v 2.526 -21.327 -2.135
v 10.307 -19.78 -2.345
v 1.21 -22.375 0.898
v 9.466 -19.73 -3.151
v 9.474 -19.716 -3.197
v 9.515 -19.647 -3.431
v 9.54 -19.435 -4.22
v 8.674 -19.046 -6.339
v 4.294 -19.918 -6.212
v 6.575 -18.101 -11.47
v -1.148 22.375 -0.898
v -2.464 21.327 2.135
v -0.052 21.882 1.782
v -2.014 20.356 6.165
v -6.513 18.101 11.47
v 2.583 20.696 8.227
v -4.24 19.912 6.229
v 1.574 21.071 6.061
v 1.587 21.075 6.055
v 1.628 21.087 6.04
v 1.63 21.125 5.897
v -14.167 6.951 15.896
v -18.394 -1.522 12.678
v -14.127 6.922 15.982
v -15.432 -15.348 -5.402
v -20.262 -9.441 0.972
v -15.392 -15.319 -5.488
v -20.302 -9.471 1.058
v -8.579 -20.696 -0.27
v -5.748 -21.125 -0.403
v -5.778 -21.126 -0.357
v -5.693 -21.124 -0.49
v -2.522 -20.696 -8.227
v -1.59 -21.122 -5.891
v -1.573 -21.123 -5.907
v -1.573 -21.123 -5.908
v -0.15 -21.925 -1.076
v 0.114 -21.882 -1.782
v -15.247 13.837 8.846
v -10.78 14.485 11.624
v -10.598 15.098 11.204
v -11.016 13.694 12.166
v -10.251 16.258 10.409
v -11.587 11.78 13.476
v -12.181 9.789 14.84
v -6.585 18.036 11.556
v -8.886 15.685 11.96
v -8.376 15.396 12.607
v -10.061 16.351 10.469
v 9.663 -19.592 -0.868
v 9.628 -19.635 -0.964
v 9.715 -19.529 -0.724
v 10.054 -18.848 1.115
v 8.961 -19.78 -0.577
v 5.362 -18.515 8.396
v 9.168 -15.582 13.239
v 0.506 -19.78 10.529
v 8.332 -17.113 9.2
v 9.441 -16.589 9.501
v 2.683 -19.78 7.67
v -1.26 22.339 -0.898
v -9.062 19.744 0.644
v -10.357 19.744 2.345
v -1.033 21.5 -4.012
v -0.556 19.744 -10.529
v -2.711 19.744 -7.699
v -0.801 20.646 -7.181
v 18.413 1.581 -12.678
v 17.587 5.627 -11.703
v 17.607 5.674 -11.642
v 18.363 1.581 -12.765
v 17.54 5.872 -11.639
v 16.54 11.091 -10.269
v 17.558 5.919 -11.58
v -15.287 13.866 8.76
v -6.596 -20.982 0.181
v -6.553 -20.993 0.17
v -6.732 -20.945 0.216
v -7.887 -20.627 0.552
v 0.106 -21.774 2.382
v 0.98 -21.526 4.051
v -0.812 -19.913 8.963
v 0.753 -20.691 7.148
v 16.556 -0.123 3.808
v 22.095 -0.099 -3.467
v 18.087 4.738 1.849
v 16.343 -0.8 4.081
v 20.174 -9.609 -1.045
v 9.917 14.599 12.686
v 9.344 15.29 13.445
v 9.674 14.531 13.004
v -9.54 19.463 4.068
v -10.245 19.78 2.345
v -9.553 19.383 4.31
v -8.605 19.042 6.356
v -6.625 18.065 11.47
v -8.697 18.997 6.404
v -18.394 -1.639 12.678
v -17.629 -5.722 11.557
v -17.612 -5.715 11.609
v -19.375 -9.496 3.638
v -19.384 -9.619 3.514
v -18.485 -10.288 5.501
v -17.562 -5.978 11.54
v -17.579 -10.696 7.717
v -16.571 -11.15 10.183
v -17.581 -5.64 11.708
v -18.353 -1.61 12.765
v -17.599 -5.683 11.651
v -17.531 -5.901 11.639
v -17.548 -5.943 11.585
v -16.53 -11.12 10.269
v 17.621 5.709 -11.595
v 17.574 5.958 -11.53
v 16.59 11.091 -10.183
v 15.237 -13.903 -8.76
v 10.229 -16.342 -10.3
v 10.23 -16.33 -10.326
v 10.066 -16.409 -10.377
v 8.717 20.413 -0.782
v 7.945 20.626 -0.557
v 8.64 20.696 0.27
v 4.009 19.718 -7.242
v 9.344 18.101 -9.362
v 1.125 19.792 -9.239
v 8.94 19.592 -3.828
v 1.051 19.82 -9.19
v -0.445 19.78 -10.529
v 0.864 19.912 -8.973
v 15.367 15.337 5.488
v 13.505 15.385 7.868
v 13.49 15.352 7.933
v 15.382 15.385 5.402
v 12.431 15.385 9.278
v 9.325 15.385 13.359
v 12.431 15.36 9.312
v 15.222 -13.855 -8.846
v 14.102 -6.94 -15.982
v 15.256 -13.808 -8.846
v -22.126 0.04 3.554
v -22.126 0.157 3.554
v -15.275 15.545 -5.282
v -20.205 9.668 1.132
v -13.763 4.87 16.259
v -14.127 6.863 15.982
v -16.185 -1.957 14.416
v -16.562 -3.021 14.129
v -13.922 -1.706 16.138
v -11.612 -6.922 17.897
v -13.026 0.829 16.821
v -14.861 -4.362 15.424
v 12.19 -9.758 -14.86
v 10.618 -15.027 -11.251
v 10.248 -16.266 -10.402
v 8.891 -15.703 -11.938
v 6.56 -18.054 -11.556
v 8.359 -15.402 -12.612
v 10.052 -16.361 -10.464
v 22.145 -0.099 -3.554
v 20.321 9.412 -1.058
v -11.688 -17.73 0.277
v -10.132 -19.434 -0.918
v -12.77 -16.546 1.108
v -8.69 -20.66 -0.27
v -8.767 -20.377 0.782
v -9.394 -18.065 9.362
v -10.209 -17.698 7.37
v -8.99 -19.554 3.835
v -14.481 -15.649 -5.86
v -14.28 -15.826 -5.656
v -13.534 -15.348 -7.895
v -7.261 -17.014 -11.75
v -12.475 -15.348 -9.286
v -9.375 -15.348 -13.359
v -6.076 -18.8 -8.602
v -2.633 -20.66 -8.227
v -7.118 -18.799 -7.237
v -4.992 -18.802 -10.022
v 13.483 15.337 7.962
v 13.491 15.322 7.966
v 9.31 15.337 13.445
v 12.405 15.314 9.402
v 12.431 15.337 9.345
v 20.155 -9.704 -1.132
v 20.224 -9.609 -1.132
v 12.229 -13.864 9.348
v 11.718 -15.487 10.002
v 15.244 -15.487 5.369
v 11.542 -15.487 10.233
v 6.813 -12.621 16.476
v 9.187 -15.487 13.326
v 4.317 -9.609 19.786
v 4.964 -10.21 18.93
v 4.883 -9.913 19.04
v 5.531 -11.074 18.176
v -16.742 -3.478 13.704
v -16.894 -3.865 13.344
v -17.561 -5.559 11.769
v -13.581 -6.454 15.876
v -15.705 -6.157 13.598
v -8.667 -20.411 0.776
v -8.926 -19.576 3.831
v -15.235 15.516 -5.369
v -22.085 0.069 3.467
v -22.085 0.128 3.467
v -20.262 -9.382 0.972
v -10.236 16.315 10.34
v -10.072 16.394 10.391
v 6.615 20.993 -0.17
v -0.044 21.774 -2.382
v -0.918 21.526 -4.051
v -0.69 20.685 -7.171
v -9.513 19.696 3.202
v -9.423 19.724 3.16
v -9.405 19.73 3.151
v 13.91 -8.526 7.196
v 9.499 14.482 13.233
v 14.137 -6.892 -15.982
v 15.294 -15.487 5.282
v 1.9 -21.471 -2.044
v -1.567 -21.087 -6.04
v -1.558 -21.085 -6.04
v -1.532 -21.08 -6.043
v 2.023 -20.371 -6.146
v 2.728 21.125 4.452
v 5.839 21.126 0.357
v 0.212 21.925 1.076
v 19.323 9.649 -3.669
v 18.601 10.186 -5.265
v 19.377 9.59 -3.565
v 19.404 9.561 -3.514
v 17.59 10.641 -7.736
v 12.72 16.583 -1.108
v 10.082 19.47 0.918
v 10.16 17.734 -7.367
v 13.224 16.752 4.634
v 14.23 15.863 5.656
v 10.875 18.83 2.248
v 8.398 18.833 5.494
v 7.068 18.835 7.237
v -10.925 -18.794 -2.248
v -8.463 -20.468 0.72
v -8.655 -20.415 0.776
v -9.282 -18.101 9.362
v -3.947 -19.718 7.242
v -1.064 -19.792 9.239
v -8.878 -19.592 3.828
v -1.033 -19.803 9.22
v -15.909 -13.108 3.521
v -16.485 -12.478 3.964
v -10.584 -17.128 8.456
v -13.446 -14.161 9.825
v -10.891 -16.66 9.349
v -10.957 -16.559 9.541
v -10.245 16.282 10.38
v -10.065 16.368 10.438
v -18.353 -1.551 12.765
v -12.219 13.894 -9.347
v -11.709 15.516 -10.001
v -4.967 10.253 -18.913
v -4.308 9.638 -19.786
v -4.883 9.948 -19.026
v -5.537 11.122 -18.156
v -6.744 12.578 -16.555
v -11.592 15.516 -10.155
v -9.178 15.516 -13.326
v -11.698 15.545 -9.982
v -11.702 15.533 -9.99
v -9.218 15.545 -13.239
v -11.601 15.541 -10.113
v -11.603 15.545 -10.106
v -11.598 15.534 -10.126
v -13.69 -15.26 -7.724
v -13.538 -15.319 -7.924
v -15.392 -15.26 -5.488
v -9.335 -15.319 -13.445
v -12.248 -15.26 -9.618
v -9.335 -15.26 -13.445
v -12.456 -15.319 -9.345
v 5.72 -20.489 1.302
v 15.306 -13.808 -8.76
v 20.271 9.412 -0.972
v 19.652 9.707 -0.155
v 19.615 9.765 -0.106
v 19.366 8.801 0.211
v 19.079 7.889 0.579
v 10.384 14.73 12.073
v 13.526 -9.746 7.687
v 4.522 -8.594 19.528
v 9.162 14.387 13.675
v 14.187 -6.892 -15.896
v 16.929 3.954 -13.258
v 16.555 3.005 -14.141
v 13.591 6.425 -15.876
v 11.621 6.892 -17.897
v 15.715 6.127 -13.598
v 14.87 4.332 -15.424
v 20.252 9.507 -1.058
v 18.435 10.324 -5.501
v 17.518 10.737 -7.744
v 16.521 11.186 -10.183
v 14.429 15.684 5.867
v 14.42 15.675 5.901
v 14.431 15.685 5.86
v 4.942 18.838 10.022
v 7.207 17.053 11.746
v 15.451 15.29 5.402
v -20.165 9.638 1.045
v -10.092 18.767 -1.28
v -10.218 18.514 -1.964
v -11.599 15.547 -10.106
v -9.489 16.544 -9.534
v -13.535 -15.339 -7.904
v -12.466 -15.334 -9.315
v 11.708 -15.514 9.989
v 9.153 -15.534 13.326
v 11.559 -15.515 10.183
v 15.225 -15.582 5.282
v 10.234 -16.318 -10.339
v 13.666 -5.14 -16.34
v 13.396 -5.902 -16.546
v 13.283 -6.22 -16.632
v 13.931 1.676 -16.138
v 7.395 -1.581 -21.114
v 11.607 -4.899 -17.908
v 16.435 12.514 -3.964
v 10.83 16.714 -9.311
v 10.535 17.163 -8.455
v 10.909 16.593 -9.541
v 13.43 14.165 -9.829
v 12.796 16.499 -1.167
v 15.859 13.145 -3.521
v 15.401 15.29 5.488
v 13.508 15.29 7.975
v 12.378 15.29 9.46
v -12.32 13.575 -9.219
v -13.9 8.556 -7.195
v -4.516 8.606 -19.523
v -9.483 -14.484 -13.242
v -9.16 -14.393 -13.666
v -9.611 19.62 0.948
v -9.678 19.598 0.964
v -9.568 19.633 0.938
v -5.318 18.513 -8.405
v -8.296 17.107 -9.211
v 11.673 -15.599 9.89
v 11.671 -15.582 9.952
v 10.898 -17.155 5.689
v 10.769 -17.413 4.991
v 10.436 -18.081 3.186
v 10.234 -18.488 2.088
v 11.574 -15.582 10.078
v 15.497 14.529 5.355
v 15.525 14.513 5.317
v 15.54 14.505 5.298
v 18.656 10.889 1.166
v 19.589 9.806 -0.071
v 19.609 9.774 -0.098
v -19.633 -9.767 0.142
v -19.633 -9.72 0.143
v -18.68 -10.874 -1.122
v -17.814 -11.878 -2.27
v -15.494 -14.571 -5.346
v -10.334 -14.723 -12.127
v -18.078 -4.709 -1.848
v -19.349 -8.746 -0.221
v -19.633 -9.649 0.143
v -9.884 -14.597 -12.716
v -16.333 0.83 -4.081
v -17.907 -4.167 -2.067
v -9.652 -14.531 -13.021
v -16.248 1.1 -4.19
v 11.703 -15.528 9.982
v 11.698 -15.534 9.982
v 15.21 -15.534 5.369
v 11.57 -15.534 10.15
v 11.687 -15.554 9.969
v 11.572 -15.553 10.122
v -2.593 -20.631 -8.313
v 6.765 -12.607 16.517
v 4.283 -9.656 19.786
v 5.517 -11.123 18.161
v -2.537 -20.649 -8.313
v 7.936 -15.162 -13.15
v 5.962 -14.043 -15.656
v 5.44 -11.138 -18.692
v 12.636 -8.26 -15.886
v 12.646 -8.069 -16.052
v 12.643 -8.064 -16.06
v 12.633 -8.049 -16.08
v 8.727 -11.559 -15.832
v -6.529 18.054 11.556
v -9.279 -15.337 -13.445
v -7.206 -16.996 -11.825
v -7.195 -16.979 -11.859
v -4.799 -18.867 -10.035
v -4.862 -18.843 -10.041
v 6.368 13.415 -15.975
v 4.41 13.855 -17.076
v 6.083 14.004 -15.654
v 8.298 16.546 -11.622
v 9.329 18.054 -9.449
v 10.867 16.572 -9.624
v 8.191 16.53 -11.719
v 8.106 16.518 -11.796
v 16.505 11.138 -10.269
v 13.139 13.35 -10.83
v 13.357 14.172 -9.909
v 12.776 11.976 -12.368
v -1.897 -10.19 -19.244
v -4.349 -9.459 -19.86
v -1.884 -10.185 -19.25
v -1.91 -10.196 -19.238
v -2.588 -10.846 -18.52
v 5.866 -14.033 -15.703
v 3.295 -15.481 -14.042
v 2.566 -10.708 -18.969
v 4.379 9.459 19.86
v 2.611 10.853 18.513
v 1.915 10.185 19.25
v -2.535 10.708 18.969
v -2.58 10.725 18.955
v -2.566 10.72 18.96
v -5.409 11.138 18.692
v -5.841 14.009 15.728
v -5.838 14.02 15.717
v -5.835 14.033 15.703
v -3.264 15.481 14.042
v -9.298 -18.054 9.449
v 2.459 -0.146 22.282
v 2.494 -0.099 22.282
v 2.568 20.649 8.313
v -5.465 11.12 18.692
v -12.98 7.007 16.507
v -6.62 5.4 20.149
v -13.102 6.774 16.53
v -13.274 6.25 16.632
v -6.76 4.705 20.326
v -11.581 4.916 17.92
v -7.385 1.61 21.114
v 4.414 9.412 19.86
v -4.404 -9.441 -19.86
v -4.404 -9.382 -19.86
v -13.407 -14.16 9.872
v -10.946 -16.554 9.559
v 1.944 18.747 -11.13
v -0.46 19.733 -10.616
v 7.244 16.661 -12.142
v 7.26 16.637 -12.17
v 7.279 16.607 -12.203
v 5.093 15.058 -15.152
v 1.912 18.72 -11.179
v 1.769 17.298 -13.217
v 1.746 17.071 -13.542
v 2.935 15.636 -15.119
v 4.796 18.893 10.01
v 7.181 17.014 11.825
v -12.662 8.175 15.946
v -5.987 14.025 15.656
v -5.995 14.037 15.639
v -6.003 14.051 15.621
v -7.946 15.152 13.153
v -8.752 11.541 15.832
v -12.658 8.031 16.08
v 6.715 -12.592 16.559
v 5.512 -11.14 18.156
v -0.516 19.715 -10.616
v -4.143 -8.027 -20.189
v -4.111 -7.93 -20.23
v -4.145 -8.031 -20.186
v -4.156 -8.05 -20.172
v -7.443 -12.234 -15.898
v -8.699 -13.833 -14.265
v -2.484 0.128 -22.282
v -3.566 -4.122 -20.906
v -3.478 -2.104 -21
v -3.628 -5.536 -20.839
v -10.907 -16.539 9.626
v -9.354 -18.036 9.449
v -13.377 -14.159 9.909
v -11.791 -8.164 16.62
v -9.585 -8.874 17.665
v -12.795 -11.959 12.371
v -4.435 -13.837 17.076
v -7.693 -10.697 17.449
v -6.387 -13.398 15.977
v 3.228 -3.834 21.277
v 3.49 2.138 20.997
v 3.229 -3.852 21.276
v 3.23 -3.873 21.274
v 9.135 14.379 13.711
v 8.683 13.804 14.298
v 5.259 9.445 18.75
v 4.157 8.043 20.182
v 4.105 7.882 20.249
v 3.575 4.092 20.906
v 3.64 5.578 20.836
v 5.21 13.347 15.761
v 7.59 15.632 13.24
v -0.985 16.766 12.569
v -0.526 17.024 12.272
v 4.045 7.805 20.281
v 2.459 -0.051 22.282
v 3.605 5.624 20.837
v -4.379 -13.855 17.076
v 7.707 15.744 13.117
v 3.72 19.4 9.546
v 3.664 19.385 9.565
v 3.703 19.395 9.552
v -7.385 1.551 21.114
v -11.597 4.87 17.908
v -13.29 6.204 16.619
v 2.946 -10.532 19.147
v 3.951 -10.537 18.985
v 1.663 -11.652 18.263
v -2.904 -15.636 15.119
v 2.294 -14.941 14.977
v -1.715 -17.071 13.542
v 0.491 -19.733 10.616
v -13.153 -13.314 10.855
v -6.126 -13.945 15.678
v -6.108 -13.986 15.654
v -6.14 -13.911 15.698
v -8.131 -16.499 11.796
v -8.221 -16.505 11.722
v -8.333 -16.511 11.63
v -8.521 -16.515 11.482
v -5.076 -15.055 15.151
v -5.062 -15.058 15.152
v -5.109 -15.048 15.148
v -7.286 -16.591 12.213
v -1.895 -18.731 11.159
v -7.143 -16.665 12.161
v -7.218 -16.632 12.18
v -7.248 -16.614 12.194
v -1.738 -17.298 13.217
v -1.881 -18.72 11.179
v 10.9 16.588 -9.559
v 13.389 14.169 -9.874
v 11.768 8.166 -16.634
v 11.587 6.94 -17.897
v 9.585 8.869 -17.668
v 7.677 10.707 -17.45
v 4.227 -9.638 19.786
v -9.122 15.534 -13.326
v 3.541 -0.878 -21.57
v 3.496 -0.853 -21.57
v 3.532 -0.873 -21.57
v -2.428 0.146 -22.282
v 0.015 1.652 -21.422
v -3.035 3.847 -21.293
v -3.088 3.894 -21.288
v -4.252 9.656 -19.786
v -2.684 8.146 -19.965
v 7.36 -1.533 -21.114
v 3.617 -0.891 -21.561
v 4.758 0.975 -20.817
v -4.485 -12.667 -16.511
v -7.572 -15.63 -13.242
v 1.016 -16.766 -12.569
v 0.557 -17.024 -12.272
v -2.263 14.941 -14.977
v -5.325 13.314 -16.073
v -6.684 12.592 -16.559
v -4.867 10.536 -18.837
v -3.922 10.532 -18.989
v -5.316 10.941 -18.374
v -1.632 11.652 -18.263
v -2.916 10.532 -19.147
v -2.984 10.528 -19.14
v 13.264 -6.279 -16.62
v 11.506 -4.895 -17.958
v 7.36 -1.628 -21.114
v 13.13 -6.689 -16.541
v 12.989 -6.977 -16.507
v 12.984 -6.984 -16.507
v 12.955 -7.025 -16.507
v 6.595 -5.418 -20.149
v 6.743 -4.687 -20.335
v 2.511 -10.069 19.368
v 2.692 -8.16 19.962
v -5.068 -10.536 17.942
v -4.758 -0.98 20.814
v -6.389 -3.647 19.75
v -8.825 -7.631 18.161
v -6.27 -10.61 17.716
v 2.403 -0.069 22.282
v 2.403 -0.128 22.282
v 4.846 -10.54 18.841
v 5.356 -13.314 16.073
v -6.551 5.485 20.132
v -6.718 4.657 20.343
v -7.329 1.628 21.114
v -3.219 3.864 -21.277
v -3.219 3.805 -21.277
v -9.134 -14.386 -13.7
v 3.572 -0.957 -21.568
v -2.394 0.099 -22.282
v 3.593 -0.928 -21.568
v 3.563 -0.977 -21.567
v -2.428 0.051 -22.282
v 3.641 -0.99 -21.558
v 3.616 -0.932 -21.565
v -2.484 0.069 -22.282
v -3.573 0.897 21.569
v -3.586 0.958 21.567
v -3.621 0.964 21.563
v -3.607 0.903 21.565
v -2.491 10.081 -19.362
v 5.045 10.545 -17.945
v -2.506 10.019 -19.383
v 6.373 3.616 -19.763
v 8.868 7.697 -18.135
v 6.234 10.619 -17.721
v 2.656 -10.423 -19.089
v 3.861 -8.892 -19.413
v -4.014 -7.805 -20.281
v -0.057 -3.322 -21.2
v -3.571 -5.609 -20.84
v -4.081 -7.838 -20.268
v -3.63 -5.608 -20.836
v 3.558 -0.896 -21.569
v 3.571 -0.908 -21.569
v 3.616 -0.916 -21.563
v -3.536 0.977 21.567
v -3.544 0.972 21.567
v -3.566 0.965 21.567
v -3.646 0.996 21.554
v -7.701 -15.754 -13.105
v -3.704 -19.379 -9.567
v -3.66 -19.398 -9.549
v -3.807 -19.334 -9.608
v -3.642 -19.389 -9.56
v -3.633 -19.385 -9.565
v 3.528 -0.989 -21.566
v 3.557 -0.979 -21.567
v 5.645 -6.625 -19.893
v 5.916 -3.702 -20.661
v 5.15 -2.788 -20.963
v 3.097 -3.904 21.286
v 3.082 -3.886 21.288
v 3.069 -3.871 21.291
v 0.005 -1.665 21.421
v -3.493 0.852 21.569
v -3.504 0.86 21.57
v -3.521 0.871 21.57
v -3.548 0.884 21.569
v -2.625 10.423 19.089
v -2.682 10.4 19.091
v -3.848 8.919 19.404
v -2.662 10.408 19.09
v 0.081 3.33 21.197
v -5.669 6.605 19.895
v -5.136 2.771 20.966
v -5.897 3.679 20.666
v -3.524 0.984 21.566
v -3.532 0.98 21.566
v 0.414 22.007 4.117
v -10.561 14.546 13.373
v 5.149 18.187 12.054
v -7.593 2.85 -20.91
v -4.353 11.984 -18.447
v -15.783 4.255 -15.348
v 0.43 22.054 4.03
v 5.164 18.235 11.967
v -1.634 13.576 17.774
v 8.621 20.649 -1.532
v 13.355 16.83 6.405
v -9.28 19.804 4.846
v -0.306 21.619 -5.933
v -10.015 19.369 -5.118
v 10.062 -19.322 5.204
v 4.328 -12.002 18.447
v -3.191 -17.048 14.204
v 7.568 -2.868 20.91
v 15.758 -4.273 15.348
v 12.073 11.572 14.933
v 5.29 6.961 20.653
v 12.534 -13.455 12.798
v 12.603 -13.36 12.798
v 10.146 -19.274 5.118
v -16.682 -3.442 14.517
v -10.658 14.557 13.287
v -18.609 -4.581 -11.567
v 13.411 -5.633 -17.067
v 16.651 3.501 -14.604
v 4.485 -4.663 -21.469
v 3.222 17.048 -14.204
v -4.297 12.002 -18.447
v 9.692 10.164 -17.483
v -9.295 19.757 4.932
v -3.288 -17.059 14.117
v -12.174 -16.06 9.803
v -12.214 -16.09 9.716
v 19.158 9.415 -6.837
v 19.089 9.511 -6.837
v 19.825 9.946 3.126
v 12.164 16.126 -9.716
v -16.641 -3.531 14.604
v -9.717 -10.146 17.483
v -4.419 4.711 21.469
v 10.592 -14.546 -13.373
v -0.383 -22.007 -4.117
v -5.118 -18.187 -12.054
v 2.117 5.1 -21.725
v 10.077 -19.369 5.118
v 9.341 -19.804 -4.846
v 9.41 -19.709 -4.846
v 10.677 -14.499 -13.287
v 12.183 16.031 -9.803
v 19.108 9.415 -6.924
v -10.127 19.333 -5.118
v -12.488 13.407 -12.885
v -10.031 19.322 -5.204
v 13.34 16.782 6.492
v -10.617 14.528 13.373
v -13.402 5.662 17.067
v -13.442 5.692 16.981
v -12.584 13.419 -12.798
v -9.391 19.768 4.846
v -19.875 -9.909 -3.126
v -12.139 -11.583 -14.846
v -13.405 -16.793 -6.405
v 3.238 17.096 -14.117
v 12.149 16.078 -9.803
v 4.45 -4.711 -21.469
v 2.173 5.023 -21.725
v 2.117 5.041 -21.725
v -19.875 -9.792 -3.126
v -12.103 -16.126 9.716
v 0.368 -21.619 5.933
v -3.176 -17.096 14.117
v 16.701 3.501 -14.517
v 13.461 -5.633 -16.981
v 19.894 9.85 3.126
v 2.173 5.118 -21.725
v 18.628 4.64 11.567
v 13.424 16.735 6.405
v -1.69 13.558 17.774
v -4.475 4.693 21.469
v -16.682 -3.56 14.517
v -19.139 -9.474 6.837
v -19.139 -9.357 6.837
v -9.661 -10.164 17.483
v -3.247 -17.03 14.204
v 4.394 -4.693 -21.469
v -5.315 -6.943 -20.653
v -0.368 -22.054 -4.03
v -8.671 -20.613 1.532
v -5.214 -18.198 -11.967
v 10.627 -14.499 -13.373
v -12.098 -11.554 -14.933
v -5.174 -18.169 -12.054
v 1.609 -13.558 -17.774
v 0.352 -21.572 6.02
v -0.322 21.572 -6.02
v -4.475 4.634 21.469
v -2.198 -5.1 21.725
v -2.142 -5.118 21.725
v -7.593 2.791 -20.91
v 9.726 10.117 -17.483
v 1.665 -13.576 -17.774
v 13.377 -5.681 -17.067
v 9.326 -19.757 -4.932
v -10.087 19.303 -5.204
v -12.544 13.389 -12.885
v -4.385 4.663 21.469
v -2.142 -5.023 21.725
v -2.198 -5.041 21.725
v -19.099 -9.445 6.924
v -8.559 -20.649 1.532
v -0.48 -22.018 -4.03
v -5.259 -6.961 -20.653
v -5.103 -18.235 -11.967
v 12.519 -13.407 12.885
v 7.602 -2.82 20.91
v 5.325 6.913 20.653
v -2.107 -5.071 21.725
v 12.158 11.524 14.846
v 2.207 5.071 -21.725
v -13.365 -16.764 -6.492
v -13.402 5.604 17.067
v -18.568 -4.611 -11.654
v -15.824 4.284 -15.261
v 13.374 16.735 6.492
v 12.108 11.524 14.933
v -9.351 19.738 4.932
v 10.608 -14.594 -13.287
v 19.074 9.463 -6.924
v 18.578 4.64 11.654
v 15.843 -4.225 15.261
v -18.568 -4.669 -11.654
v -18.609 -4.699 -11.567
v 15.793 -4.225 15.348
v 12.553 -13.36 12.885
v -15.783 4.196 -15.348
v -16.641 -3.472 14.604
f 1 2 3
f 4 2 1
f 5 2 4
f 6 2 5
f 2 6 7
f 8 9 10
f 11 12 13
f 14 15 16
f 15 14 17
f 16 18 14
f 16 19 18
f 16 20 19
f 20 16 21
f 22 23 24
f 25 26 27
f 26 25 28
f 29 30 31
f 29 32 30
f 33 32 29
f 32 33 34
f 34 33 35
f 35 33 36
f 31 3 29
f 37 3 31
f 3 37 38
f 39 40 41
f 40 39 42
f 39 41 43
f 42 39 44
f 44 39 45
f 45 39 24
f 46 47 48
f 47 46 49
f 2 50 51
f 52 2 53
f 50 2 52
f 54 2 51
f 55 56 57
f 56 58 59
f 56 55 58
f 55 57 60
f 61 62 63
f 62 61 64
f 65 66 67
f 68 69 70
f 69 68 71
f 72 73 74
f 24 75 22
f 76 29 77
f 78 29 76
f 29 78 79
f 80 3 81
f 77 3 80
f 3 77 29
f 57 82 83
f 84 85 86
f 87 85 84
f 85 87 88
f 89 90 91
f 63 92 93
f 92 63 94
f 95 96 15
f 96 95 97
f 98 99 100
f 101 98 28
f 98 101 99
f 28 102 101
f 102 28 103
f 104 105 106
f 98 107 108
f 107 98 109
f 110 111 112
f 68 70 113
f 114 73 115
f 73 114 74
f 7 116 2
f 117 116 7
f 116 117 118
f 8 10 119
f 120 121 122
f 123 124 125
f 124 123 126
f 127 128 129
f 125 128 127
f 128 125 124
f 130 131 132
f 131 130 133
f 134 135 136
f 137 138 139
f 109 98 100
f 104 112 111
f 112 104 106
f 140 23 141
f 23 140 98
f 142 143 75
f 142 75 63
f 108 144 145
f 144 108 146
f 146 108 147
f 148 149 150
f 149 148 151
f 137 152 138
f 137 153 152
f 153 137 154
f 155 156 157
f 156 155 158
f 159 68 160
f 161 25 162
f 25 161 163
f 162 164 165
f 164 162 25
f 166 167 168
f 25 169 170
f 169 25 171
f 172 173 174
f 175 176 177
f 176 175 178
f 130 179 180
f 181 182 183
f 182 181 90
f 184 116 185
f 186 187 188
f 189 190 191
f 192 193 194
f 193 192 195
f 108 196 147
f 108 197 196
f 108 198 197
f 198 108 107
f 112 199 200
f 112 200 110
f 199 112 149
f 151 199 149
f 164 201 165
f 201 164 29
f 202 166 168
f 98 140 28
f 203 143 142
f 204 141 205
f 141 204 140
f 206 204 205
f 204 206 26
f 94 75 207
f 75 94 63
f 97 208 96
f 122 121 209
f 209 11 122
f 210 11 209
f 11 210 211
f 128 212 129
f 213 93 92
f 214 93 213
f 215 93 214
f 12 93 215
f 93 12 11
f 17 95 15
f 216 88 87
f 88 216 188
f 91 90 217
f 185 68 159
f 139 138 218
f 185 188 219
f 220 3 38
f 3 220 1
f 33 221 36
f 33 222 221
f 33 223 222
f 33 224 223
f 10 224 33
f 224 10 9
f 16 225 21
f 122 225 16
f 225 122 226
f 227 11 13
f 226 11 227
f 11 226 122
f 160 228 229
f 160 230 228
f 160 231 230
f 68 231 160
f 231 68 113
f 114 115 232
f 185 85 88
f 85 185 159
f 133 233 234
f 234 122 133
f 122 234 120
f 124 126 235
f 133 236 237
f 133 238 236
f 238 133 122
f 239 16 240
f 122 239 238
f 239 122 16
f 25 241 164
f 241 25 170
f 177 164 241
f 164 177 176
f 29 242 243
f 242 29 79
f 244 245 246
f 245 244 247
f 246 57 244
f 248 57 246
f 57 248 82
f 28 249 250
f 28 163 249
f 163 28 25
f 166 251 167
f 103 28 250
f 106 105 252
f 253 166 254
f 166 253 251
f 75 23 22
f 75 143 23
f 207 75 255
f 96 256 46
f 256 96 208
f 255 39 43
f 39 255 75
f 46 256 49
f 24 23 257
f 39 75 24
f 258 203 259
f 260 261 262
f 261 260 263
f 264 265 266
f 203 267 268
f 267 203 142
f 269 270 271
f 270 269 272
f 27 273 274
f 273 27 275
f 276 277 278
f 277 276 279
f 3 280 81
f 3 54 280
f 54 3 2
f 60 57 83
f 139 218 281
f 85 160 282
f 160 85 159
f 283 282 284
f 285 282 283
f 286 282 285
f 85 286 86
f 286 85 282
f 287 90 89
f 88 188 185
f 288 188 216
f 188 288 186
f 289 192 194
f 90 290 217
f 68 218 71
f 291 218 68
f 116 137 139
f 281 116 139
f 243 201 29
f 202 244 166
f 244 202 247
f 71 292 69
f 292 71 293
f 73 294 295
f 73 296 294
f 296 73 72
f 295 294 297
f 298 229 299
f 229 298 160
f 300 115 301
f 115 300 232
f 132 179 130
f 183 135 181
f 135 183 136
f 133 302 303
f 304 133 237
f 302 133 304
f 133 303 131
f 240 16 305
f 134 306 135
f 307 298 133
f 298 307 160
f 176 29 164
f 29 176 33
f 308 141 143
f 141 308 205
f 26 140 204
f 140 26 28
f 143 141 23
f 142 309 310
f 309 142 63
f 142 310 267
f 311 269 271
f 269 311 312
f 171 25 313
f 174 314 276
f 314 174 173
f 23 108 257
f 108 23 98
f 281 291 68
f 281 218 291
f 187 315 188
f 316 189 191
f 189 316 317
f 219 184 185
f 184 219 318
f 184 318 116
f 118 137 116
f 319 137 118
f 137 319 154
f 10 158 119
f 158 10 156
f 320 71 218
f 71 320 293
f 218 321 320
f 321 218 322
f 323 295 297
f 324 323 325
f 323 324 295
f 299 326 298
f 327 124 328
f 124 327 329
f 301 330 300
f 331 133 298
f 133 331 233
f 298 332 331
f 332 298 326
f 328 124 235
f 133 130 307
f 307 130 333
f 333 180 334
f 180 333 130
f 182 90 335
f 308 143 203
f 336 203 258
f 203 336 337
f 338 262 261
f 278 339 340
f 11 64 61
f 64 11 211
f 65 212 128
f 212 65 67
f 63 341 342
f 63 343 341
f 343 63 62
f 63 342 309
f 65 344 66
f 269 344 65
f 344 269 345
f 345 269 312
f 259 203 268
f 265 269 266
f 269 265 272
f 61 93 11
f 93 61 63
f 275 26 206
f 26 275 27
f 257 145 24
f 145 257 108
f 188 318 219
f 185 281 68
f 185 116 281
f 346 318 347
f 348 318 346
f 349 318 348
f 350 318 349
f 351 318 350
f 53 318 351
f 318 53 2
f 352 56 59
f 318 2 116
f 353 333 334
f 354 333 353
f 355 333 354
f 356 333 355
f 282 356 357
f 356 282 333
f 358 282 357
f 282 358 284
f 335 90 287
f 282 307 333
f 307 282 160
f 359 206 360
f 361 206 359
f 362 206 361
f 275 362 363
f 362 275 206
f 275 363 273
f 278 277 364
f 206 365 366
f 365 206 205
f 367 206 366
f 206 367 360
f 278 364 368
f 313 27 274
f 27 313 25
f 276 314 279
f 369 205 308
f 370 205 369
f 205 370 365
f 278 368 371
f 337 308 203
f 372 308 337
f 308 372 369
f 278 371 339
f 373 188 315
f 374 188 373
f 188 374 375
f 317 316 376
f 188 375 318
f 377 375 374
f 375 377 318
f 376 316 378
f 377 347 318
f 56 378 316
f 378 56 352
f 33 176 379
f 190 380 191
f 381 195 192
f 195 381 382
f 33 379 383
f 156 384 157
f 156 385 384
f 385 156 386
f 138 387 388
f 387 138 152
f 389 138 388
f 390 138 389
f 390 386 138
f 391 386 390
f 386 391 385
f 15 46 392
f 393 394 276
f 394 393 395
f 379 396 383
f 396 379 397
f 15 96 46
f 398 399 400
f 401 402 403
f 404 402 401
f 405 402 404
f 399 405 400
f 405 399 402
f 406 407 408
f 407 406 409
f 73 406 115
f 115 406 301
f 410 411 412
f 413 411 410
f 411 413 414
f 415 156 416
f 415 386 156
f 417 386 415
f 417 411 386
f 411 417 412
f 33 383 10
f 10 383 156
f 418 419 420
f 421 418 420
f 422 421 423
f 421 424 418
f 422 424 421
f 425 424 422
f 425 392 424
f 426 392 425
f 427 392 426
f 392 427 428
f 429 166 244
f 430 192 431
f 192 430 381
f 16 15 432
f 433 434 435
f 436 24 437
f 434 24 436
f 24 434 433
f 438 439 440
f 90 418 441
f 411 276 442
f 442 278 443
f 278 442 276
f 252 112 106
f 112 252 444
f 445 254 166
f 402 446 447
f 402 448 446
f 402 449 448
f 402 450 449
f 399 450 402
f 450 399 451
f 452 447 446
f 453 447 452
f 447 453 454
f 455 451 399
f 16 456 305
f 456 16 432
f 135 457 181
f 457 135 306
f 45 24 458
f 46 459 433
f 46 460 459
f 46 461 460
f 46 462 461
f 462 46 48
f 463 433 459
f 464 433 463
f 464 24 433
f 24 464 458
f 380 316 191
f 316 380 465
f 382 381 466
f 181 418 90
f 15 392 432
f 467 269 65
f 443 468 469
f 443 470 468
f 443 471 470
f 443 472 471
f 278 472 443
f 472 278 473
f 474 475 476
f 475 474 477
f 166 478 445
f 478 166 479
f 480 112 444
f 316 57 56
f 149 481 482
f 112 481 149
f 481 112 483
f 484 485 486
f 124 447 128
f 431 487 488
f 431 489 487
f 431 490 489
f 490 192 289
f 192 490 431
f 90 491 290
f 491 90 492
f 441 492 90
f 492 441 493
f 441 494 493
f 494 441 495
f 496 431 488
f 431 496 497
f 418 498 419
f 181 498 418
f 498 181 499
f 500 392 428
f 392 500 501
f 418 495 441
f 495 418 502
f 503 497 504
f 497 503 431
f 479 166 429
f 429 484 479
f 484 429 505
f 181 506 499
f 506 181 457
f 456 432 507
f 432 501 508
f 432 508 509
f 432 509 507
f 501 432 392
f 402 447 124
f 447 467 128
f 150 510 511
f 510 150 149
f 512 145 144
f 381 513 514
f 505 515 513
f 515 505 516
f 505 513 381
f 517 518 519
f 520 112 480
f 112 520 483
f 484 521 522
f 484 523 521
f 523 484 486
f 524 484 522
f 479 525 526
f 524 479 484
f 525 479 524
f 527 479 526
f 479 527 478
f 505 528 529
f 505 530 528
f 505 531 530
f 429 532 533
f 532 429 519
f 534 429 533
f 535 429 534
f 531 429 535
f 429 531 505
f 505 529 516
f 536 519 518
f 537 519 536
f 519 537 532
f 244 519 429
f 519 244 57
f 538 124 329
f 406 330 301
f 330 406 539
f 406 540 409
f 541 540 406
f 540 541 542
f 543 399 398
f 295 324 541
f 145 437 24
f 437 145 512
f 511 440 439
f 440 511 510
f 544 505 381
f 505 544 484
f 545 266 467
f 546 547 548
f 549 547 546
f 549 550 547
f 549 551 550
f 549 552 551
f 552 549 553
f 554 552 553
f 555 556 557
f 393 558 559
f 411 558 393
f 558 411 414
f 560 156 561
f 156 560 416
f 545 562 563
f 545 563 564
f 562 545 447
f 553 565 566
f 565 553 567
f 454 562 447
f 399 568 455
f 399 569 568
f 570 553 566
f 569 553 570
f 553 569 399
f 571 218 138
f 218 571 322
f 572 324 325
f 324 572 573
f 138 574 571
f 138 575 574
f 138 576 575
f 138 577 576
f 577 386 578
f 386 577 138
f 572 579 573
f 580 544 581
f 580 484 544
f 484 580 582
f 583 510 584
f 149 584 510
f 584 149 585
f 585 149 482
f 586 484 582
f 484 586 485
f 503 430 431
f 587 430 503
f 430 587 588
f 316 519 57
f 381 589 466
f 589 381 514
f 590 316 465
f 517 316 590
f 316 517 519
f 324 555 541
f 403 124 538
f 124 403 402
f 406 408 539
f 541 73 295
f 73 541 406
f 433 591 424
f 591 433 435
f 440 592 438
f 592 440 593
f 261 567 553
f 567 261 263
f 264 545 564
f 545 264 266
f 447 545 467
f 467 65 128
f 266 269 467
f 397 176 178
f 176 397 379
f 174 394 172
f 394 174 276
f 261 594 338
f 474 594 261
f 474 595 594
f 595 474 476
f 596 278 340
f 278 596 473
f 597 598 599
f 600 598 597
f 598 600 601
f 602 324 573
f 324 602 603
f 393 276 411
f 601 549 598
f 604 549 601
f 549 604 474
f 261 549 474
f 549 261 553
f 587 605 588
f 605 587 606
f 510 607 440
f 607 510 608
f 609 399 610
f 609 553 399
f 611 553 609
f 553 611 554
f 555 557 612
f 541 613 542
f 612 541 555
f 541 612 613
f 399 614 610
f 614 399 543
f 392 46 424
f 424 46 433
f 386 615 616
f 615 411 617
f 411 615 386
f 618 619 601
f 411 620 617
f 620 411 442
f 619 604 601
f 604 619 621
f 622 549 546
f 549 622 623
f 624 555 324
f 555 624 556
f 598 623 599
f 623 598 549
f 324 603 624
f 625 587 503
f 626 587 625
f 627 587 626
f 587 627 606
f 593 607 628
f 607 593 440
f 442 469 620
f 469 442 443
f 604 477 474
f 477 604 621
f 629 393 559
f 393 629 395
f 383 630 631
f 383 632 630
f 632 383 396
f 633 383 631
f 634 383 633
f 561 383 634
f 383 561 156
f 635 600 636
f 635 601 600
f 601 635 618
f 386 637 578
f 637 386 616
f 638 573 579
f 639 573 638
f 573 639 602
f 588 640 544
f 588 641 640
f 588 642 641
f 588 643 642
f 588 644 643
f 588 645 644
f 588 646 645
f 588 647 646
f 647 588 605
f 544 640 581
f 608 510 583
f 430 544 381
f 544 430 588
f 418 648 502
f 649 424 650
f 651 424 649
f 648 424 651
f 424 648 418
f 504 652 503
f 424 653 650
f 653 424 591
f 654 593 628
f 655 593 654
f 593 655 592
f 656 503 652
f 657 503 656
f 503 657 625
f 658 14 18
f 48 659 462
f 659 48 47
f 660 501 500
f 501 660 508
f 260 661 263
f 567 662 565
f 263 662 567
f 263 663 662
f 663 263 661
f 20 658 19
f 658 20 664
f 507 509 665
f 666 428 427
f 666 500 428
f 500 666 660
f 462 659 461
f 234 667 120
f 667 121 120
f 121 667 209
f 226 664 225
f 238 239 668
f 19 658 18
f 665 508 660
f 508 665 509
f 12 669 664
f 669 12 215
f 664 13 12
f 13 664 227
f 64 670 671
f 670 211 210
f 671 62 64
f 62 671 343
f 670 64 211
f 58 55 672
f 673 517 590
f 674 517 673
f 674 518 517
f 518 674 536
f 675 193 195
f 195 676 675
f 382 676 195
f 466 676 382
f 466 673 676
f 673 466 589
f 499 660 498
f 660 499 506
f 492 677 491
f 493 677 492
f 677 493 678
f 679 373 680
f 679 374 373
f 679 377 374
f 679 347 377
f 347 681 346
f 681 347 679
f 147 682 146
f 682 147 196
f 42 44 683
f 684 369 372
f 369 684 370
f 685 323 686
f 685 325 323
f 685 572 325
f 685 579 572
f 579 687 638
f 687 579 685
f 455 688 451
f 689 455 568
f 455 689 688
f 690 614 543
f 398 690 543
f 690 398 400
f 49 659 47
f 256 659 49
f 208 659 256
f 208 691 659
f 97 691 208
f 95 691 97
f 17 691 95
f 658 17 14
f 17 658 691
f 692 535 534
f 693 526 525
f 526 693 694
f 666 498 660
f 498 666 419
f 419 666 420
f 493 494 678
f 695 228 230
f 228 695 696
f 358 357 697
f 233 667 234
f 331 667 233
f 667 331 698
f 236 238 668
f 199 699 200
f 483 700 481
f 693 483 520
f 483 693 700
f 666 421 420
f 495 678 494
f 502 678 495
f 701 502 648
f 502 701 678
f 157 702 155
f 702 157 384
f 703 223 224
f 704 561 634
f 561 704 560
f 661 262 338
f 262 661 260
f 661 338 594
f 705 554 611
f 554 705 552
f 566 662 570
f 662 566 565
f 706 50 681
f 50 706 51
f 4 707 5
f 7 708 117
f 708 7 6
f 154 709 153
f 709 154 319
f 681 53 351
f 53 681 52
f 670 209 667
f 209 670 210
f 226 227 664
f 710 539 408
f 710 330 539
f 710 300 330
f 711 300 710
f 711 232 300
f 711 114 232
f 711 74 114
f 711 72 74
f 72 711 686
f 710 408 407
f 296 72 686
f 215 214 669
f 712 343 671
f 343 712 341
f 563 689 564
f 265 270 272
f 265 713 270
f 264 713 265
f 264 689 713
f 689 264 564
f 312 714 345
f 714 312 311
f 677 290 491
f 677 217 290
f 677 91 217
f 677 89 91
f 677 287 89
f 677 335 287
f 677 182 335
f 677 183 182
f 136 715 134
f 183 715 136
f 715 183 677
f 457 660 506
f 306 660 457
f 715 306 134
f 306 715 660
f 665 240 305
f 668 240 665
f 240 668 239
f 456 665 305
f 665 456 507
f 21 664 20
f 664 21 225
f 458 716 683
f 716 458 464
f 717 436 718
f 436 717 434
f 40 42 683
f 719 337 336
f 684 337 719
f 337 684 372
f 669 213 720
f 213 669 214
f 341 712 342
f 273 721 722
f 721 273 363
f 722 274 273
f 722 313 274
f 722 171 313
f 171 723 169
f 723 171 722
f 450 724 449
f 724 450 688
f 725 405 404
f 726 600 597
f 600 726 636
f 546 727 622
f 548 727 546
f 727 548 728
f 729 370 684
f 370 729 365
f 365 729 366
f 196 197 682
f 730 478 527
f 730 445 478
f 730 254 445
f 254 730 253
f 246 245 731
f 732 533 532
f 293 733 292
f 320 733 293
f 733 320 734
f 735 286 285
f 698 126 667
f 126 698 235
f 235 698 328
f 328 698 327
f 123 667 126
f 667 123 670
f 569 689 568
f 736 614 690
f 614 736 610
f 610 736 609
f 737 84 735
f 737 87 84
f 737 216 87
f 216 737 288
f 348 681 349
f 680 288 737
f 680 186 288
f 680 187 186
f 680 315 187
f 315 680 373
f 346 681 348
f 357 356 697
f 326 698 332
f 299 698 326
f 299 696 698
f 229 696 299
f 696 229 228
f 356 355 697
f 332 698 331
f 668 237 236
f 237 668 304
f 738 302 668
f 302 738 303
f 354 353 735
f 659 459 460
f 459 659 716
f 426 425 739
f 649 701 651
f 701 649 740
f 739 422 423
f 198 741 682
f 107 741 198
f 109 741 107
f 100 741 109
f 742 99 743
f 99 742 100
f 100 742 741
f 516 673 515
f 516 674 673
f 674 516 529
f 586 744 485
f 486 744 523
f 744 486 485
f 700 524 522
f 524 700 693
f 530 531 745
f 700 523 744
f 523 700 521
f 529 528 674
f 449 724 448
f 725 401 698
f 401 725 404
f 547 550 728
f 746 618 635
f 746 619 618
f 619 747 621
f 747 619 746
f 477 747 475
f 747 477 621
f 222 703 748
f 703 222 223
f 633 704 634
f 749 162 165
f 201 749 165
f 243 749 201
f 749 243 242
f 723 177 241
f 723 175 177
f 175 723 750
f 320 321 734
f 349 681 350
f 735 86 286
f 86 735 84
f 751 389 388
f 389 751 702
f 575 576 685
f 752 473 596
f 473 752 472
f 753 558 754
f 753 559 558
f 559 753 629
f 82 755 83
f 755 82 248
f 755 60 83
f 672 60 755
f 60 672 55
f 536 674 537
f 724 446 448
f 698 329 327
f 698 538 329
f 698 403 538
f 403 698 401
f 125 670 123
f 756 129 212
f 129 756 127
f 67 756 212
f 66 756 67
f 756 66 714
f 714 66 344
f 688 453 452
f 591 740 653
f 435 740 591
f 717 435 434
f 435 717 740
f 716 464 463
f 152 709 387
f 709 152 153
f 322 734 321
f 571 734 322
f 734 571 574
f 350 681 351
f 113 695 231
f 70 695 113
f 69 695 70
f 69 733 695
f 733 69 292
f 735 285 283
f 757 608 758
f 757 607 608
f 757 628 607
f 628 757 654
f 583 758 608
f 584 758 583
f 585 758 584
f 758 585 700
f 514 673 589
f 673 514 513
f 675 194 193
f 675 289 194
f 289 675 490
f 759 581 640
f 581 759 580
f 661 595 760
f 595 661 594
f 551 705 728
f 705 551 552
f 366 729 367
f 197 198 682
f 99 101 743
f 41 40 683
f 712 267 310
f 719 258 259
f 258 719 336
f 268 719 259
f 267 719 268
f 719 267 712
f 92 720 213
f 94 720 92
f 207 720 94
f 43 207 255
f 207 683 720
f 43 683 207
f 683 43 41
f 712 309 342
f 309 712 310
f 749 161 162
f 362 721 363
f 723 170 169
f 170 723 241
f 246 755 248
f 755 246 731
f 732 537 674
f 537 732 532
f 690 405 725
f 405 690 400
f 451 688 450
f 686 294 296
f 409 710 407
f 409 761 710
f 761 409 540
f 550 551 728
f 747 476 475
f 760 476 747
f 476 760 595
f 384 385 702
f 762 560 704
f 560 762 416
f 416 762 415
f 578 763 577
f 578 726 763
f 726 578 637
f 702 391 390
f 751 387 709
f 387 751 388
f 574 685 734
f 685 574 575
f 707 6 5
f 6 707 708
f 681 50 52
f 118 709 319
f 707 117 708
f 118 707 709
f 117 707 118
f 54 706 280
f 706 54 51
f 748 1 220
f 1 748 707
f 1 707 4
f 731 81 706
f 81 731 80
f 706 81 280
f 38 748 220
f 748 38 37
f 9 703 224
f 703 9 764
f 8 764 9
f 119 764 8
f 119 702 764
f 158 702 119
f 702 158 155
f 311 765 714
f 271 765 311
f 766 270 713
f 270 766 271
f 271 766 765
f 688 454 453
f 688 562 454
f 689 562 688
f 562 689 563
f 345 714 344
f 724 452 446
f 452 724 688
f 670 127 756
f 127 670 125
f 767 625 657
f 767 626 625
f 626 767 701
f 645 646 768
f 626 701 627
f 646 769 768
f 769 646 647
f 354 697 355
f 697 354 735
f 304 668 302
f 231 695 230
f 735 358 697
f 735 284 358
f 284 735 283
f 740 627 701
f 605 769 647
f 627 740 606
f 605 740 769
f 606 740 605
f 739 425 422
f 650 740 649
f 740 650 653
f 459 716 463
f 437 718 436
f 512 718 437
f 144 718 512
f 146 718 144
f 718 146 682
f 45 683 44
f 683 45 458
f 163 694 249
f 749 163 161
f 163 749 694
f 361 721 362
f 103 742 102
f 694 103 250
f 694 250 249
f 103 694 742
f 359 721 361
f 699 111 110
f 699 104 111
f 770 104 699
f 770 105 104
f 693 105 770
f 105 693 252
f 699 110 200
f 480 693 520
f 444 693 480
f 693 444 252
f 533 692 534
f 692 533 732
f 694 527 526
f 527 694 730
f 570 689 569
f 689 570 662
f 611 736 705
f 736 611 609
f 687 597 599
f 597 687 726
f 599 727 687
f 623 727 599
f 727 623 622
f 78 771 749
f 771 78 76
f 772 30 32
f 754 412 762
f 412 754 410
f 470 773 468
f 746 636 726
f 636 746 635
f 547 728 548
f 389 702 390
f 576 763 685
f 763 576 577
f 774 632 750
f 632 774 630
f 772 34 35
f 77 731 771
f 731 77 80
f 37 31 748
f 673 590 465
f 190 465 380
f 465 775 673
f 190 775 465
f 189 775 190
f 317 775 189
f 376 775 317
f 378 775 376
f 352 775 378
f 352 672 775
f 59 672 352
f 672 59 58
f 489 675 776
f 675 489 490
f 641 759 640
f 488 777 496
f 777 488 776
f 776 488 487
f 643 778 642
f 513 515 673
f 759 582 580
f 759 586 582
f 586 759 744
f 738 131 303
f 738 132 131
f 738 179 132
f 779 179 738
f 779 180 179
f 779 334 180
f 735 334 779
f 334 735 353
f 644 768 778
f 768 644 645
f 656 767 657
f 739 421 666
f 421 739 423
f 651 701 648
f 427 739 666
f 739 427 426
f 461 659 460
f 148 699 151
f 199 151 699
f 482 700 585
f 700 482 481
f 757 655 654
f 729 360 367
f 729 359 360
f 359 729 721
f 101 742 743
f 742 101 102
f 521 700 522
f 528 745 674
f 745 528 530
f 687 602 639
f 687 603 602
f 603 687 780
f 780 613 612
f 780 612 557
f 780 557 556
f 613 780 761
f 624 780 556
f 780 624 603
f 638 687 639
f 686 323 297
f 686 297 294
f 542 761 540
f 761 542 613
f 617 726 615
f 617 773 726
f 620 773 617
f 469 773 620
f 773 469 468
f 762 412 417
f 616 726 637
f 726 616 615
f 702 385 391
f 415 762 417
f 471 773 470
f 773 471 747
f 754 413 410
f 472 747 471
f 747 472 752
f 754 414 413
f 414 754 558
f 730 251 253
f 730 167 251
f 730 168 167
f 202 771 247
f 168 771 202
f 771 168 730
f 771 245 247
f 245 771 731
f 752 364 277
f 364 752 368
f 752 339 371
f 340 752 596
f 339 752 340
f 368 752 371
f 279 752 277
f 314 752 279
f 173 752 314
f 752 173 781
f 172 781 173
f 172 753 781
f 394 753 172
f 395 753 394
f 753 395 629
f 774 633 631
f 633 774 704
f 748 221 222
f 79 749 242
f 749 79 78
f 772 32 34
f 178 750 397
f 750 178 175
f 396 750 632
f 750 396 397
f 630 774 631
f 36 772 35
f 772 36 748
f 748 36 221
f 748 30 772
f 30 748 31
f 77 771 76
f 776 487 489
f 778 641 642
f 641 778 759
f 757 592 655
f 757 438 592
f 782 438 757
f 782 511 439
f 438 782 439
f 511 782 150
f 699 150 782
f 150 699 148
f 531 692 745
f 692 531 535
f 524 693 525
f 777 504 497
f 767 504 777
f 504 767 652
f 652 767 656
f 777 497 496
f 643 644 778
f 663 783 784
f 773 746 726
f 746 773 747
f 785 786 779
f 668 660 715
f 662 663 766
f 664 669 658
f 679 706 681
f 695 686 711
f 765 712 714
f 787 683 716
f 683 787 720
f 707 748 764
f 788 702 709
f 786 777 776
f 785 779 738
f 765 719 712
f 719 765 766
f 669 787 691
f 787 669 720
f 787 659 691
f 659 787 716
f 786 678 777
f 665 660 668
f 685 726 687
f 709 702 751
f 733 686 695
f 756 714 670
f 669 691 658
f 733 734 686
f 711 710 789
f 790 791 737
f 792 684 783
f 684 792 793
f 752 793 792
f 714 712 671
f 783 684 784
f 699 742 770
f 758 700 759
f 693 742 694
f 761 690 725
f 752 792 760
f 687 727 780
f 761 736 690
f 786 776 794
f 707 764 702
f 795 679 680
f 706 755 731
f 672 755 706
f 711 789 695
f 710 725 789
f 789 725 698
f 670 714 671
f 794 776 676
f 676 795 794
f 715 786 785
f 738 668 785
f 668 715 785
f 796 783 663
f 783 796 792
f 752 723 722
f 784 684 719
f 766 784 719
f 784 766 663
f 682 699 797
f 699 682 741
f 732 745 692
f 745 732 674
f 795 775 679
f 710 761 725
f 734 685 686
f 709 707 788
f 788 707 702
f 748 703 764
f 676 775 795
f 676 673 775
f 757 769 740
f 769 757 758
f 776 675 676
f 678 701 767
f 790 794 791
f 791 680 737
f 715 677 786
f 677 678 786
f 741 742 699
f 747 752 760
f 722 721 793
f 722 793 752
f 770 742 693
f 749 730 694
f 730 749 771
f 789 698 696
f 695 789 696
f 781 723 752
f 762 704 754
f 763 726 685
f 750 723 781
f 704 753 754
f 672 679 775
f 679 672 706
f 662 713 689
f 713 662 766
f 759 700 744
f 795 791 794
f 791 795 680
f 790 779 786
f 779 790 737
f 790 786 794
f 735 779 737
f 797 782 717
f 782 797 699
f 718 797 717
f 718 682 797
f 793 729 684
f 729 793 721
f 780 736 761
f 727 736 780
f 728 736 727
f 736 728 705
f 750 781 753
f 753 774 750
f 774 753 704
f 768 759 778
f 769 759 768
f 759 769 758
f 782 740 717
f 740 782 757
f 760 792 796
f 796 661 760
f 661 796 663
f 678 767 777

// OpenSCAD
// Auto-generated OpenSCAD file

    inner_points = 10*[[0.9310411281195976, -1.9708956644454598, -0.48456235421219784], [-0.033699334115551816, 2.1524185182257494, -0.5933185103962525], [-0.03989472684997508, -2.195916826294735, -0.40302069458653744], [-1.0046351890851246, 1.9273973563764744, -0.5117768507705921], [1.0046351890851246, -1.9273973563764744, 0.5117768507705921], [0.03989472684997508, 2.195916826294735, 0.40302069458653744], [0.033699334115551816, -2.1524185182257494, 0.5933185103962525], [-0.9310411281195976, 1.9708956644454598, 0.48456235421219784], [0.4434653698557001, -0.46631153386828283, -2.1382142073749177], [0.21572104012363613, 0.5070709058311078, -2.1638880532059384], [-0.5274704851138725, -0.6913326957175581, -2.0566725477492573], [-0.7552148148459366, 0.2820497439818326, -2.082346393580278], [0.7552148148459366, -0.2820497439818326, 2.082346393580278], [0.5274704851138725, 0.6913326957175581, 2.0566725477492573], [-0.21572104012363613, -0.5070709058311078, 2.1638880532059384], [-0.4434653698557001, 0.46631153386828283, 2.1382142073749177], [-1.9794000073382254, -0.9850428428689444, -0.3126246729896607], [1.9058059463726982, 0.9415445347999587, -0.6837145319931293], [-1.9058059463726982, -0.9415445347999587, 0.6837145319931293], [1.9794000073382254, 0.9850428428689444, 0.3126246729896607], [-0.8589781717453047, -2.055421900397042, 0.1531838416188064], [0.8589781717453047, 2.055421900397042, -0.1531838416188064], [0.16498829102009893, -1.3528633341160017, -1.7687870534721224], [-0.4312541049635078, 1.1954849770692983, -1.83600205447966], [0.4312541049635078, -1.1954849770692983, 1.83600205447966], [-0.16498829102009893, 1.3528633341160017, 1.7687870534721224], [1.6601035855989856, 0.3501270813904757, -1.4517351994968535], [-1.8527753385768673, -0.4640071303681936, -1.1567147034721392], [1.8527753385768673, 0.4640071303681936, 1.1567147034721392], [-1.6601035855989856, -0.3501270813904757, 1.4517351994968535], [1.0576657968809553, -1.4498599519447088, -1.3286523846946763], [0.32066966437787003, 1.7000717910271093, -1.4117346950477099], [-0.5133414173557517, -1.8139518400048271, -1.1967152079212828], [-1.2503375498588372, 1.335979902966991, -1.2797975182743164], [1.2503375498588372, -1.335979902966991, 1.2797975182743164], [0.5133414173557517, 1.8139518400048271, 1.1967152079212828], [-0.32066966437787003, -1.7000717910271093, 1.4117346950477099], [-1.0576657968809553, 1.4498599519447088, 1.3286523846946763], [1.3361428757165568, -0.56330815169699, -1.6980795385974714], [0.9676448094650141, 1.0116577197889192, -1.7396206937739882], [-1.2058001934897236, -1.152421201606384, -1.4846007021984173], [-1.574298259741266, 0.4225446698795252, -1.5261418573749341], [1.574298259741266, -0.4225446698795252, 1.5261418573749341], [1.2058001934897236, 1.152421201606384, 1.4846007021984173], [-0.9676448094650141, -1.0116577197889192, 1.7396206937739882], [-1.3361428757165568, 0.56330815169699, 1.6980795385974714], [-1.332424862251081, -1.6734569141071347, -0.6405106717159389], [1.2133471702387264, 1.6030751731984023, -0.9716000262702639], [-1.2133471702387264, -1.6030751731984023, 0.9716000262702639], [1.332424862251081, 1.6734569141071347, 0.6405106717159389]];

    outer_points = 10*[[-1.5351098190494932, -1.528959426375013, -0.5401748730333669], [0.2552450391175369, 2.060125161586024, 0.8226799293199251], [-0.8609437043177841, -2.060125161586024, -0.026985812856419433], [0.929411153849246, 1.528959426375013, 1.3358689894968725], [-0.929411153849246, -1.528959426375013, -1.3358689894968725], [0.8609437043177841, 2.060125161586024, 0.026985812856419433], [-0.2552450391175369, -2.060125161586024, -0.8226799293199251], [1.5351098190494932, 1.528959426375013, 0.5401748730333669], [-1.8312961423876284, -0.15805110227230856, 1.2678494648208398], [-1.4086506920132147, 0.6892168374833194, 1.589575841638257], [-1.157130027655919, -0.6892168374833194, 1.7810385249977874], [-0.7344845772815055, 0.15805110227230856, 2.1027649018152044], [0.7344845772815055, -0.15805110227230856, -2.1027649018152044], [1.157130027655919, 0.6892168374833194, -1.7810385249977874], [1.4086506920132147, -0.6892168374833194, -1.589575841638257], [1.8312961423876284, 0.15805110227230856, -1.2678494648208398], [0.9137346872778909, -1.5486610507140617, 1.323935741932434], [-1.519433352478138, 1.5486610507140617, -0.5282416254689284], [1.519433352478138, -1.5486610507140617, 0.5282416254689284], [-0.9137346872778909, 1.5486610507140617, -1.323935741932434], [0.11792209889297003, -2.228027076027857, 0.08976471789754577], [-0.11792209889297003, 2.228027076027857, -0.08976471789754577], [-1.6489692559528297, -1.109088131929166, 1.0182788842139632], [-0.542469101682108, 1.109088131929166, 1.8605694737993177], [0.542469101682108, -1.109088131929166, -1.8605694737993177], [1.6489692559528297, 1.109088131929166, -1.0182788842139632], [-2.0124478047987377, 0.960887841826382, 0.11320938958748228], [0.42670811236404715, -0.960887841826382, 1.969944851962293], [-0.42670811236404715, 0.960887841826382, -1.969944851962293], [2.0124478047987377, -0.960887841826382, -0.11320938958748228], [-2.0221363939633368, -0.9411862174873333, 0.10583423699649219], [-0.6544269861707203, 1.8006304307180756, 1.146962662532367], [-0.9313127062639702, -1.8006304307180756, 0.9361915790174082], [0.4363967015286464, 0.9411862174873333, 1.977320004553283], [-0.4363967015286464, -0.9411862174873333, -1.977320004553283], [0.9313127062639702, 1.8006304307180756, -0.9361915790174082], [0.6544269861707203, -1.8006304307180756, -1.146962662532367], [2.0221363939633368, 0.9411862174873333, -0.10583423699649219], [-2.2044632803981354, 0.009850812169524326, 0.35540481760336906], [-1.520608576501827, 1.380759136272229, 0.8759690303713064], [-0.4394734779670596, -1.380759136272229, 1.6989512198012324], [0.2443812259292486, -0.009850812169524326, 2.2195154325691697], [-0.2443812259292486, 0.009850812169524326, -2.2195154325691697], [0.4394734779670596, 1.380759136272229, -1.6989512198012324], [1.520608576501827, -1.380759136272229, -0.8759690303713064], [2.2044632803981354, -0.009850812169524326, -0.35540481760336906], [0.04755309694678411, -1.9685323451599084, 1.0529421097713736], [-1.0275941241812274, 1.9685323451599084, 0.2345180153148959], [1.0275941241812274, -1.9685323451599084, -0.2345180153148959], [-0.04755309694678411, 1.9685323451599084, -1.0529421097713736]];

    // Convex hull for inner set (I)
    module inner_hull() {
        hull() {
            for (p = inner_points) {
                translate(p) sphere(r=0.1);
            }
        }
    }

    // Convex hull for outer set (O) minus inner hull (O \ I)
    module outer_minus_inner() {
        difference() {
            hull() {
                for (p = outer_points) {
                    translate(p) sphere(r=0.1);
                }
            }
            inner_hull(); // Subtract inner hull
        }
    }

    // Convex hull for outer set (O) minus all translated inner hulls
    module outer_minus_AllTranslationInner() {
        difference() {
            hull() {
                for (p = outer_points) {
                    translate(p) sphere(r=0.1);
                }
            }
            hull() {
                translate([0,0,50]) inner_hull();
                translate([0,0,-50]) inner_hull();
            }; // Subtract translated inner hulls
        }
    }

    // Difference between outer_minus_inner and outer_minus_AllTranslationInner
    module outer_minus_inner_diff() {
        difference() {
            // Outer minus inner
            difference() {
                hull() {
                    for (p = outer_points) {
                        translate(p) sphere(r=0.1);
                    }
                }
                inner_hull();
            }

            // Subtract Outer minus AllTranslationInner
            difference() {
                hull() {
                    for (p = outer_points) {
                        translate(p) sphere(r=0.1);
                    }
                }
                hull() {
                    translate([0,0,50]) inner_hull();
                    translate([0,0,-50]) inner_hull();
                };
            }
        }
    }

    // Rendering all with colors applied
    color([1, 0, 0, 0.5]) inner_hull(); // Transparent red
    color([0, 1, 0, 1]) outer_minus_AllTranslationInner(); // Opaque green
    color([1, 1, 0, 1]) outer_minus_inner_diff(); // Opaque yellow
    
